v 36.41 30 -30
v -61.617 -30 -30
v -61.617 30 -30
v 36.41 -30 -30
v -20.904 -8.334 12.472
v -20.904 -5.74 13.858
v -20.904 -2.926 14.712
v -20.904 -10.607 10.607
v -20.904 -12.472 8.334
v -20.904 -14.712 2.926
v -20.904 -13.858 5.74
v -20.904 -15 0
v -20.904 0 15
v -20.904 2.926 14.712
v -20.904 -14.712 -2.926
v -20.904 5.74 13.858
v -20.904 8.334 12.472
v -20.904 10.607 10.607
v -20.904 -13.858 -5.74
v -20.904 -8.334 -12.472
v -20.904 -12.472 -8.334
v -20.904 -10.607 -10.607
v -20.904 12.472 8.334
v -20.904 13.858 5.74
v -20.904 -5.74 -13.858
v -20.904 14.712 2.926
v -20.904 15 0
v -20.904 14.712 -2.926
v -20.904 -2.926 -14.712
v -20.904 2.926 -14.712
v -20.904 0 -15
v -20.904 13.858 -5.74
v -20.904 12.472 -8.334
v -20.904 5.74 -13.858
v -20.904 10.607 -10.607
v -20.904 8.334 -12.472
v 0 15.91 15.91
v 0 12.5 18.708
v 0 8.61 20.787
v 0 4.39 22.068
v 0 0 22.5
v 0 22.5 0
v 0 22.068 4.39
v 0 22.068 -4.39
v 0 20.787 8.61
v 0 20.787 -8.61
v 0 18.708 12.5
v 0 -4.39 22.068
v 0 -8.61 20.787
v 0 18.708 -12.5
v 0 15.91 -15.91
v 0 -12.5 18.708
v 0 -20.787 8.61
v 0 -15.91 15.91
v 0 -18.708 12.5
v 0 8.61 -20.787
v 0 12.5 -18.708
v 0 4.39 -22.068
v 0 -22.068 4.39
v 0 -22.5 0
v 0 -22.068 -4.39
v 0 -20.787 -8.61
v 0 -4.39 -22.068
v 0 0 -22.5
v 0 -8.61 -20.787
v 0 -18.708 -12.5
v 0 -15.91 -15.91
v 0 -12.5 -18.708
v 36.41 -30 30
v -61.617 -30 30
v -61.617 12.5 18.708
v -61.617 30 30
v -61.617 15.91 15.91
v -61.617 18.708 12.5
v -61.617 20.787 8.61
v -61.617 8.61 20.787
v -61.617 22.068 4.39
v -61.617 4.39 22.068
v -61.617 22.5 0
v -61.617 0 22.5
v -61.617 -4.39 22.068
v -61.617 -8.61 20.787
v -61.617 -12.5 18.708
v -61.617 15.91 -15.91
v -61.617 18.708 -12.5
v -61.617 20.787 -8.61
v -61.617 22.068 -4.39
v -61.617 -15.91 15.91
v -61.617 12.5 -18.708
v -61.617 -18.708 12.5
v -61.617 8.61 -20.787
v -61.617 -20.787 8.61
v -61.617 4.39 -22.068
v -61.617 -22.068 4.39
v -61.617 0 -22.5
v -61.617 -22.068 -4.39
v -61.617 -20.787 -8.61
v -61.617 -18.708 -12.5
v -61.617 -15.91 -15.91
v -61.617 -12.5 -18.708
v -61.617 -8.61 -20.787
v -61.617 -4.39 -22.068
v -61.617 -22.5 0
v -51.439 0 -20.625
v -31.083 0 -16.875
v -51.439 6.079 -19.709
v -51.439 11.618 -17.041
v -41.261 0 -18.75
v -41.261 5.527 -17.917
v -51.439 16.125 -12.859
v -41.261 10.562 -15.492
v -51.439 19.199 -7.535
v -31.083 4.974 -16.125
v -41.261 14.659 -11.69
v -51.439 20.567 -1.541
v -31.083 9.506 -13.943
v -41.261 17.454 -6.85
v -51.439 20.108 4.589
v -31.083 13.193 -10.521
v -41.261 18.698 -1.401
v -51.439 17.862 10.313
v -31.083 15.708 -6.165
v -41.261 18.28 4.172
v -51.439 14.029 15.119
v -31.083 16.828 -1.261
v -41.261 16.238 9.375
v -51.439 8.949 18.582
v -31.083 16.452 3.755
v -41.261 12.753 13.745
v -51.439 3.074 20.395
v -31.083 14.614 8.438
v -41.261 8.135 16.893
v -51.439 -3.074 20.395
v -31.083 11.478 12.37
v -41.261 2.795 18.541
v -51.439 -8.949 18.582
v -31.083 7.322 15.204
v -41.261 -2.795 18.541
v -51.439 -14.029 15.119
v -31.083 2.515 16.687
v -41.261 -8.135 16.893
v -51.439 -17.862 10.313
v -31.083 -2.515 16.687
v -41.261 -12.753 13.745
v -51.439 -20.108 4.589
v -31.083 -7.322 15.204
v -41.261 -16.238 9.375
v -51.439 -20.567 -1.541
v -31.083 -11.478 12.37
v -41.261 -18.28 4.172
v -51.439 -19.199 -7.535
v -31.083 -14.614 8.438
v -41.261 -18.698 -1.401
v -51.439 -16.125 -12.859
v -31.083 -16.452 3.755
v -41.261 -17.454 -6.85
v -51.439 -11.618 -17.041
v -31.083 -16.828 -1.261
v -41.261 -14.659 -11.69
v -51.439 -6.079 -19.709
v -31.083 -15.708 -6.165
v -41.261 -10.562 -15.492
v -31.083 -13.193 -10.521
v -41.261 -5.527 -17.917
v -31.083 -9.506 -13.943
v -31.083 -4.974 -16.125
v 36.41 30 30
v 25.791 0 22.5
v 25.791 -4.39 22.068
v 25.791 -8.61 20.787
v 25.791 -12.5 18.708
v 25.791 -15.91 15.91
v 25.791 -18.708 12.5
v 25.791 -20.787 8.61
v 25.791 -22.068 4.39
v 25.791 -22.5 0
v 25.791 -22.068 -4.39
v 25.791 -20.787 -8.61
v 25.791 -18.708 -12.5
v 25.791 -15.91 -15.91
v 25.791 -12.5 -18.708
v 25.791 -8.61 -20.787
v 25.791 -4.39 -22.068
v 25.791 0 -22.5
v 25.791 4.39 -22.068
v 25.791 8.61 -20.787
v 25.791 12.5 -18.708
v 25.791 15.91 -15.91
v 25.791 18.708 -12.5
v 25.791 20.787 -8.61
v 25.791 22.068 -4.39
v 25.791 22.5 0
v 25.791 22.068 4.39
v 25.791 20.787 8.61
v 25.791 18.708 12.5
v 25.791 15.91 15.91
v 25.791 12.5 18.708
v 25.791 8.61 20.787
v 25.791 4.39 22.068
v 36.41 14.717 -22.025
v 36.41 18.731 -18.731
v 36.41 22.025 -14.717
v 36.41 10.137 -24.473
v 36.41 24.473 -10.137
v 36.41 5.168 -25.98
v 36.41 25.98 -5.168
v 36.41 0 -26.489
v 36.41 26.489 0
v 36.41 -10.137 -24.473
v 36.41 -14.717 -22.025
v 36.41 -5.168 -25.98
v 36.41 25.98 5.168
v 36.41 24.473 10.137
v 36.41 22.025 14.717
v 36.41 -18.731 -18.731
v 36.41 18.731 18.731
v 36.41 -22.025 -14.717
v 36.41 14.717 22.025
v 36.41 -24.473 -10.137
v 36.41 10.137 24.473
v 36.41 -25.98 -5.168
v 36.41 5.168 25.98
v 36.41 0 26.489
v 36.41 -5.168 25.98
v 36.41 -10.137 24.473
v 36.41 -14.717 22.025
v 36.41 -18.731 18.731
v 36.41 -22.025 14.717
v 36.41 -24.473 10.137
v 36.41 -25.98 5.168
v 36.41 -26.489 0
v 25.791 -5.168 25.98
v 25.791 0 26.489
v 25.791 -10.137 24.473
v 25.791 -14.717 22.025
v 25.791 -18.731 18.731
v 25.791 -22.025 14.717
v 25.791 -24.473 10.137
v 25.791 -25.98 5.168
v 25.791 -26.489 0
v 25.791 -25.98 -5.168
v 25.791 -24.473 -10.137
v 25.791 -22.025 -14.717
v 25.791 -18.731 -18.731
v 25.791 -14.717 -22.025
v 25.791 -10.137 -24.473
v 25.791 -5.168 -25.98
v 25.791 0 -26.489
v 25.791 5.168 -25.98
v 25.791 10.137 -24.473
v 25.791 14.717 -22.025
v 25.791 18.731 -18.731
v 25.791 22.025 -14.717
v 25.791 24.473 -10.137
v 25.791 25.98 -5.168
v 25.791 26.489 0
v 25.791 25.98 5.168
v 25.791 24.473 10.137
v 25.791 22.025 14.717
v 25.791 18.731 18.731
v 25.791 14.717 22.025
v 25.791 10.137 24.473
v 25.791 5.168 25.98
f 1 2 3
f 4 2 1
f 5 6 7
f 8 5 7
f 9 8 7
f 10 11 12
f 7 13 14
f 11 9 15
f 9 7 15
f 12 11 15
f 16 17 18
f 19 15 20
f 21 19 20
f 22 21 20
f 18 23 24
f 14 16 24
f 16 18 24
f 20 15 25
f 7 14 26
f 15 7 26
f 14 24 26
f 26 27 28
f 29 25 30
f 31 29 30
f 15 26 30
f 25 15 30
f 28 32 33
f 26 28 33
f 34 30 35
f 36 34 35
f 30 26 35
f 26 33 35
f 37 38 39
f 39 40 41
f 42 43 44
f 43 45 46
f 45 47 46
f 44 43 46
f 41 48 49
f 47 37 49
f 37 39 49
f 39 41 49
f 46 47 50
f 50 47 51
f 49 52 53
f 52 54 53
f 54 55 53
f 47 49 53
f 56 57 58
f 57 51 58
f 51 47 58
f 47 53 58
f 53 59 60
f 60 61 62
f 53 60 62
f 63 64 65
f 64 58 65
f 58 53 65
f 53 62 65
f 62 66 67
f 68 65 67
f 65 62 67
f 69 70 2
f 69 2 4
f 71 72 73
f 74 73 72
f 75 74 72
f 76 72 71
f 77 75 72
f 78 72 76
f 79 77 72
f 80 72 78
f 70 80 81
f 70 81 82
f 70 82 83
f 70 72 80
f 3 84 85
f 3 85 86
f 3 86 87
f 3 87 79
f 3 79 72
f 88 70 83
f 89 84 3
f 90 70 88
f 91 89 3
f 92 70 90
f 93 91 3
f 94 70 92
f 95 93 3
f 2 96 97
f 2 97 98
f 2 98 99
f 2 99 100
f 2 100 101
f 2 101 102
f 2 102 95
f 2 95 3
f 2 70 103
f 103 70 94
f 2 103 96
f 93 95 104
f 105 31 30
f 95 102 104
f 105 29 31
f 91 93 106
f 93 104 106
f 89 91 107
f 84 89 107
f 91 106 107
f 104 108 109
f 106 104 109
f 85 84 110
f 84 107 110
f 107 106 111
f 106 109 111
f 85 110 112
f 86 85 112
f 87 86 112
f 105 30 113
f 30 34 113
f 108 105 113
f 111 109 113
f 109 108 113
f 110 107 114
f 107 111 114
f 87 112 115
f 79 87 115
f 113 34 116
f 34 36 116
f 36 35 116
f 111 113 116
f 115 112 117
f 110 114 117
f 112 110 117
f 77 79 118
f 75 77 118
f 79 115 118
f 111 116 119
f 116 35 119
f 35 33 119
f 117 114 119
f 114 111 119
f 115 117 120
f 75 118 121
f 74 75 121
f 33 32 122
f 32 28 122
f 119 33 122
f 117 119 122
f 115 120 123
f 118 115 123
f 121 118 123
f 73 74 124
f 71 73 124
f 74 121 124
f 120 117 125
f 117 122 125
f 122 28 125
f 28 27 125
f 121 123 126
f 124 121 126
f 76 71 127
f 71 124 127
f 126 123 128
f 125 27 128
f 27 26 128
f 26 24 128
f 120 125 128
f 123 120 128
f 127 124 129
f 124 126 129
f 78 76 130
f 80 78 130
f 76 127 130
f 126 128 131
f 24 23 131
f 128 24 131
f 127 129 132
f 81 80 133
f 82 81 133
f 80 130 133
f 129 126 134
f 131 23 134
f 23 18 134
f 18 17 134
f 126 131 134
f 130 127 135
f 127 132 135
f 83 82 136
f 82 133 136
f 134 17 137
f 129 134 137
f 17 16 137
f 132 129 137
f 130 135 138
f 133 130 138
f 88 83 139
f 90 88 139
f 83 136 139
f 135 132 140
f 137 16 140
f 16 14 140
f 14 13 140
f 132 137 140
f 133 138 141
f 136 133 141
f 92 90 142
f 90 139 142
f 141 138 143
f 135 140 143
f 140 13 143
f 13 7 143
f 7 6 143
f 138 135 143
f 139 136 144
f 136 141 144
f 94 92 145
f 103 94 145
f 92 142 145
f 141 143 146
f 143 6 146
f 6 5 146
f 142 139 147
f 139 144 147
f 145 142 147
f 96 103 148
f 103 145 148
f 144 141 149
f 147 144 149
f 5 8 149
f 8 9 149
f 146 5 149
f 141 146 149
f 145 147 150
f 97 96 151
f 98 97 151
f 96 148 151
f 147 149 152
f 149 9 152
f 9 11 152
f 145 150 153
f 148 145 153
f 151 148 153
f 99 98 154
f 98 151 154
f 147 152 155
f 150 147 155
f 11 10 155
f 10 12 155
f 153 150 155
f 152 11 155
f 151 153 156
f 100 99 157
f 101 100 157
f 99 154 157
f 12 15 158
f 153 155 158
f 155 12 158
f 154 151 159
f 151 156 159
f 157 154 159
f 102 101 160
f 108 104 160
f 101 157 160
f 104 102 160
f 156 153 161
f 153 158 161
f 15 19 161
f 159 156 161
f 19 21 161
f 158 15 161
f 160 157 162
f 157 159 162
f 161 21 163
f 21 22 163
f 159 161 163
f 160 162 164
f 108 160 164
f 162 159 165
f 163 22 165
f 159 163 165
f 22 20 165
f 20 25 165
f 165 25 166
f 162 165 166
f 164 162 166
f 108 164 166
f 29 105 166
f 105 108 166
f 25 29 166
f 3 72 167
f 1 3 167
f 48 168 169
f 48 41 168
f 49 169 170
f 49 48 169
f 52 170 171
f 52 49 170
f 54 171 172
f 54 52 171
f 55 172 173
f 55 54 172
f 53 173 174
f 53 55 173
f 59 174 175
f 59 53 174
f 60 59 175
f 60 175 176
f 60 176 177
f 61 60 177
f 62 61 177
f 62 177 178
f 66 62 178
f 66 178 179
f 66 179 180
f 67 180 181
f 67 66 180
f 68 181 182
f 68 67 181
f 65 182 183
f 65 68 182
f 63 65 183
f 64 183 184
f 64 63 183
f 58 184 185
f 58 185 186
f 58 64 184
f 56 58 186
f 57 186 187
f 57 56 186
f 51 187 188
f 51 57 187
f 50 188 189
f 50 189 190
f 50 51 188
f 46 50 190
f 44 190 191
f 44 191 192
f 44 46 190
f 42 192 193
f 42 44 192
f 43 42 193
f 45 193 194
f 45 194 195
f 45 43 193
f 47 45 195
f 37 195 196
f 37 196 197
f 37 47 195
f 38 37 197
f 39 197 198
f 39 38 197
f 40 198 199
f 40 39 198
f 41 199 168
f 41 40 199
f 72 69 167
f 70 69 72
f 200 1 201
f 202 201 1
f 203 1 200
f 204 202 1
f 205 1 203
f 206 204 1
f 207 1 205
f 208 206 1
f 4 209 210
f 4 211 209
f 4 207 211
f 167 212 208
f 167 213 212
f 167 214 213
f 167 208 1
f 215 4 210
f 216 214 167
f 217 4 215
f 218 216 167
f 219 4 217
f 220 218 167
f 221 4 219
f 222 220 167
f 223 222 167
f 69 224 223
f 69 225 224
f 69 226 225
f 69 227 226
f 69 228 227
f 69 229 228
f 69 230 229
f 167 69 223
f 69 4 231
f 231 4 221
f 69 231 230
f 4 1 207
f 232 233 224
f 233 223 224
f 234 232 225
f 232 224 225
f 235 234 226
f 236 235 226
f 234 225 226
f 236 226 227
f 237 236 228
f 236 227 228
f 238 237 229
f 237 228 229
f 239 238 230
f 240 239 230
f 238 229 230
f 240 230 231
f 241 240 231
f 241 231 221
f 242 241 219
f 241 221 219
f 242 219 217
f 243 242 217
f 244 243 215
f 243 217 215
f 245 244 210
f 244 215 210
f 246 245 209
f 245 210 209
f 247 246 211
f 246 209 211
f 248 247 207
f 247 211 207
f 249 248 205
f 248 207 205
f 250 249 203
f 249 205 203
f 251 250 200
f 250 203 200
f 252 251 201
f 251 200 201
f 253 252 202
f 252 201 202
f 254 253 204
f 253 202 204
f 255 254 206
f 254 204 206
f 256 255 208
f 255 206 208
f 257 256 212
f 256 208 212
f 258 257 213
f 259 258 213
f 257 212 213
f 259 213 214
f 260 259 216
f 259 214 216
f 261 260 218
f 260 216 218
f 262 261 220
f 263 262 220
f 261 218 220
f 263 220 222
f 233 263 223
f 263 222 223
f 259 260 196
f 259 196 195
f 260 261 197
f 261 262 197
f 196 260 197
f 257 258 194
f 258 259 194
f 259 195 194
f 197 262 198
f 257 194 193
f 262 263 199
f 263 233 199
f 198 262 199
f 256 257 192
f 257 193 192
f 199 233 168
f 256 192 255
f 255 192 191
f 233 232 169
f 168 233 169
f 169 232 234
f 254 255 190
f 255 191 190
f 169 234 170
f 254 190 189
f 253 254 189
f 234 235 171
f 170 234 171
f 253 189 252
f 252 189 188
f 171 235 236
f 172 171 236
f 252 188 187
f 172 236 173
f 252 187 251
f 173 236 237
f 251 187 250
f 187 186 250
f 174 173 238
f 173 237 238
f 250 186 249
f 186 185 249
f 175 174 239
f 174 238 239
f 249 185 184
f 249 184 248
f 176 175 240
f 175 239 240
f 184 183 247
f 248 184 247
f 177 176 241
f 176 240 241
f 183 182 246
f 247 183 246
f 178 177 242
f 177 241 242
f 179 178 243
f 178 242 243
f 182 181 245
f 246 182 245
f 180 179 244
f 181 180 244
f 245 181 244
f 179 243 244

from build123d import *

# Parameters (mm, degrees)
F0_W     = 10.6189064682
F0_H     = 22.5
F0_W_2   = 25.791388005
F0_H_2   = 3.9892950654
F1_DEPTH = 30


with BuildPart() as f1:
    # F0 (on Front) → F1 (new body, symmetric)
    with BuildSketch(Plane.XZ):
        Polygon((-61.6173371673, 30), (-61.6173371673, 22.5), (-20.9044199437, 15), (-20.9044199437, 0), (-20.9044199437, -15), (-61.6173371673, -22.5), (-61.6173371673, -30), (0, -30), (36.4102944732, -30), (36.4102944732, -26.4892950654), (25.791388005, -26.4892950654), (25.791388005, -22.5), (0, -22.5), (0, 0), (0, 22.5), (25.791388005, 22.5), (25.791388005, 26.4892950654), (36.4102944732, 26.4892950654), (36.4102944732, 30), (0, 30), align=None)
        with Locations((31.1008412391, 11.25)):
            Rectangle(F0_W, F0_H)
        with Locations((12.8956940025, 11.25)):
            Rectangle(F0_W_2, F0_H)
        Polygon((-20.9044199437, 15), (-61.6173371673, 22.5), (-61.6173371673, 0), (-20.9044199437, 0), align=None)
        Polygon((-20.9044199437, 0), (-61.6173371673, 0), (-61.6173371673, -22.5), (-20.9044199437, -15), align=None)
        with Locations((31.1008412391, -11.25)):
            Rectangle(F0_W, F0_H)
        with Locations((12.8956940025, -11.25)):
            Rectangle(F0_W_2, F0_H)
        with Locations((31.1008412391, 24.4946475327)):
            Rectangle(F0_W, F0_H_2)
        with Locations((31.1008412391, -24.4946475327)):
            Rectangle(F0_W, F0_H_2)
    extrude(amount=F1_DEPTH, both=True)

    # F0 (on Front) → F2 (revolve, cut)
    with BuildSketch(Plane.XZ):
        Polygon((-20.9044199437, 0), (-61.6173371673, 0), (-61.6173371673, -22.5), (-20.9044199437, -15), align=None)
    revolve(axis=Axis((-6.6388677806, 0, 0), (1, 0, 0)), mode=Mode.SUBTRACT)

    # F0 (on Front) → F3 (revolve, cut)
    with BuildSketch(Plane.XZ):
        with Locations((31.1008412391, 11.25)):
            Rectangle(F0_W, F0_H)
        with Locations((12.8956940025, 11.25)):
            Rectangle(F0_W_2, F0_H)
        with Locations((31.1008412391, 24.4946475327)):
            Rectangle(F0_W, F0_H_2)
    revolve(axis=Axis((-6.6388677806, 0, 0), (1, 0, 0)), mode=Mode.SUBTRACT)


solid = f1.part
